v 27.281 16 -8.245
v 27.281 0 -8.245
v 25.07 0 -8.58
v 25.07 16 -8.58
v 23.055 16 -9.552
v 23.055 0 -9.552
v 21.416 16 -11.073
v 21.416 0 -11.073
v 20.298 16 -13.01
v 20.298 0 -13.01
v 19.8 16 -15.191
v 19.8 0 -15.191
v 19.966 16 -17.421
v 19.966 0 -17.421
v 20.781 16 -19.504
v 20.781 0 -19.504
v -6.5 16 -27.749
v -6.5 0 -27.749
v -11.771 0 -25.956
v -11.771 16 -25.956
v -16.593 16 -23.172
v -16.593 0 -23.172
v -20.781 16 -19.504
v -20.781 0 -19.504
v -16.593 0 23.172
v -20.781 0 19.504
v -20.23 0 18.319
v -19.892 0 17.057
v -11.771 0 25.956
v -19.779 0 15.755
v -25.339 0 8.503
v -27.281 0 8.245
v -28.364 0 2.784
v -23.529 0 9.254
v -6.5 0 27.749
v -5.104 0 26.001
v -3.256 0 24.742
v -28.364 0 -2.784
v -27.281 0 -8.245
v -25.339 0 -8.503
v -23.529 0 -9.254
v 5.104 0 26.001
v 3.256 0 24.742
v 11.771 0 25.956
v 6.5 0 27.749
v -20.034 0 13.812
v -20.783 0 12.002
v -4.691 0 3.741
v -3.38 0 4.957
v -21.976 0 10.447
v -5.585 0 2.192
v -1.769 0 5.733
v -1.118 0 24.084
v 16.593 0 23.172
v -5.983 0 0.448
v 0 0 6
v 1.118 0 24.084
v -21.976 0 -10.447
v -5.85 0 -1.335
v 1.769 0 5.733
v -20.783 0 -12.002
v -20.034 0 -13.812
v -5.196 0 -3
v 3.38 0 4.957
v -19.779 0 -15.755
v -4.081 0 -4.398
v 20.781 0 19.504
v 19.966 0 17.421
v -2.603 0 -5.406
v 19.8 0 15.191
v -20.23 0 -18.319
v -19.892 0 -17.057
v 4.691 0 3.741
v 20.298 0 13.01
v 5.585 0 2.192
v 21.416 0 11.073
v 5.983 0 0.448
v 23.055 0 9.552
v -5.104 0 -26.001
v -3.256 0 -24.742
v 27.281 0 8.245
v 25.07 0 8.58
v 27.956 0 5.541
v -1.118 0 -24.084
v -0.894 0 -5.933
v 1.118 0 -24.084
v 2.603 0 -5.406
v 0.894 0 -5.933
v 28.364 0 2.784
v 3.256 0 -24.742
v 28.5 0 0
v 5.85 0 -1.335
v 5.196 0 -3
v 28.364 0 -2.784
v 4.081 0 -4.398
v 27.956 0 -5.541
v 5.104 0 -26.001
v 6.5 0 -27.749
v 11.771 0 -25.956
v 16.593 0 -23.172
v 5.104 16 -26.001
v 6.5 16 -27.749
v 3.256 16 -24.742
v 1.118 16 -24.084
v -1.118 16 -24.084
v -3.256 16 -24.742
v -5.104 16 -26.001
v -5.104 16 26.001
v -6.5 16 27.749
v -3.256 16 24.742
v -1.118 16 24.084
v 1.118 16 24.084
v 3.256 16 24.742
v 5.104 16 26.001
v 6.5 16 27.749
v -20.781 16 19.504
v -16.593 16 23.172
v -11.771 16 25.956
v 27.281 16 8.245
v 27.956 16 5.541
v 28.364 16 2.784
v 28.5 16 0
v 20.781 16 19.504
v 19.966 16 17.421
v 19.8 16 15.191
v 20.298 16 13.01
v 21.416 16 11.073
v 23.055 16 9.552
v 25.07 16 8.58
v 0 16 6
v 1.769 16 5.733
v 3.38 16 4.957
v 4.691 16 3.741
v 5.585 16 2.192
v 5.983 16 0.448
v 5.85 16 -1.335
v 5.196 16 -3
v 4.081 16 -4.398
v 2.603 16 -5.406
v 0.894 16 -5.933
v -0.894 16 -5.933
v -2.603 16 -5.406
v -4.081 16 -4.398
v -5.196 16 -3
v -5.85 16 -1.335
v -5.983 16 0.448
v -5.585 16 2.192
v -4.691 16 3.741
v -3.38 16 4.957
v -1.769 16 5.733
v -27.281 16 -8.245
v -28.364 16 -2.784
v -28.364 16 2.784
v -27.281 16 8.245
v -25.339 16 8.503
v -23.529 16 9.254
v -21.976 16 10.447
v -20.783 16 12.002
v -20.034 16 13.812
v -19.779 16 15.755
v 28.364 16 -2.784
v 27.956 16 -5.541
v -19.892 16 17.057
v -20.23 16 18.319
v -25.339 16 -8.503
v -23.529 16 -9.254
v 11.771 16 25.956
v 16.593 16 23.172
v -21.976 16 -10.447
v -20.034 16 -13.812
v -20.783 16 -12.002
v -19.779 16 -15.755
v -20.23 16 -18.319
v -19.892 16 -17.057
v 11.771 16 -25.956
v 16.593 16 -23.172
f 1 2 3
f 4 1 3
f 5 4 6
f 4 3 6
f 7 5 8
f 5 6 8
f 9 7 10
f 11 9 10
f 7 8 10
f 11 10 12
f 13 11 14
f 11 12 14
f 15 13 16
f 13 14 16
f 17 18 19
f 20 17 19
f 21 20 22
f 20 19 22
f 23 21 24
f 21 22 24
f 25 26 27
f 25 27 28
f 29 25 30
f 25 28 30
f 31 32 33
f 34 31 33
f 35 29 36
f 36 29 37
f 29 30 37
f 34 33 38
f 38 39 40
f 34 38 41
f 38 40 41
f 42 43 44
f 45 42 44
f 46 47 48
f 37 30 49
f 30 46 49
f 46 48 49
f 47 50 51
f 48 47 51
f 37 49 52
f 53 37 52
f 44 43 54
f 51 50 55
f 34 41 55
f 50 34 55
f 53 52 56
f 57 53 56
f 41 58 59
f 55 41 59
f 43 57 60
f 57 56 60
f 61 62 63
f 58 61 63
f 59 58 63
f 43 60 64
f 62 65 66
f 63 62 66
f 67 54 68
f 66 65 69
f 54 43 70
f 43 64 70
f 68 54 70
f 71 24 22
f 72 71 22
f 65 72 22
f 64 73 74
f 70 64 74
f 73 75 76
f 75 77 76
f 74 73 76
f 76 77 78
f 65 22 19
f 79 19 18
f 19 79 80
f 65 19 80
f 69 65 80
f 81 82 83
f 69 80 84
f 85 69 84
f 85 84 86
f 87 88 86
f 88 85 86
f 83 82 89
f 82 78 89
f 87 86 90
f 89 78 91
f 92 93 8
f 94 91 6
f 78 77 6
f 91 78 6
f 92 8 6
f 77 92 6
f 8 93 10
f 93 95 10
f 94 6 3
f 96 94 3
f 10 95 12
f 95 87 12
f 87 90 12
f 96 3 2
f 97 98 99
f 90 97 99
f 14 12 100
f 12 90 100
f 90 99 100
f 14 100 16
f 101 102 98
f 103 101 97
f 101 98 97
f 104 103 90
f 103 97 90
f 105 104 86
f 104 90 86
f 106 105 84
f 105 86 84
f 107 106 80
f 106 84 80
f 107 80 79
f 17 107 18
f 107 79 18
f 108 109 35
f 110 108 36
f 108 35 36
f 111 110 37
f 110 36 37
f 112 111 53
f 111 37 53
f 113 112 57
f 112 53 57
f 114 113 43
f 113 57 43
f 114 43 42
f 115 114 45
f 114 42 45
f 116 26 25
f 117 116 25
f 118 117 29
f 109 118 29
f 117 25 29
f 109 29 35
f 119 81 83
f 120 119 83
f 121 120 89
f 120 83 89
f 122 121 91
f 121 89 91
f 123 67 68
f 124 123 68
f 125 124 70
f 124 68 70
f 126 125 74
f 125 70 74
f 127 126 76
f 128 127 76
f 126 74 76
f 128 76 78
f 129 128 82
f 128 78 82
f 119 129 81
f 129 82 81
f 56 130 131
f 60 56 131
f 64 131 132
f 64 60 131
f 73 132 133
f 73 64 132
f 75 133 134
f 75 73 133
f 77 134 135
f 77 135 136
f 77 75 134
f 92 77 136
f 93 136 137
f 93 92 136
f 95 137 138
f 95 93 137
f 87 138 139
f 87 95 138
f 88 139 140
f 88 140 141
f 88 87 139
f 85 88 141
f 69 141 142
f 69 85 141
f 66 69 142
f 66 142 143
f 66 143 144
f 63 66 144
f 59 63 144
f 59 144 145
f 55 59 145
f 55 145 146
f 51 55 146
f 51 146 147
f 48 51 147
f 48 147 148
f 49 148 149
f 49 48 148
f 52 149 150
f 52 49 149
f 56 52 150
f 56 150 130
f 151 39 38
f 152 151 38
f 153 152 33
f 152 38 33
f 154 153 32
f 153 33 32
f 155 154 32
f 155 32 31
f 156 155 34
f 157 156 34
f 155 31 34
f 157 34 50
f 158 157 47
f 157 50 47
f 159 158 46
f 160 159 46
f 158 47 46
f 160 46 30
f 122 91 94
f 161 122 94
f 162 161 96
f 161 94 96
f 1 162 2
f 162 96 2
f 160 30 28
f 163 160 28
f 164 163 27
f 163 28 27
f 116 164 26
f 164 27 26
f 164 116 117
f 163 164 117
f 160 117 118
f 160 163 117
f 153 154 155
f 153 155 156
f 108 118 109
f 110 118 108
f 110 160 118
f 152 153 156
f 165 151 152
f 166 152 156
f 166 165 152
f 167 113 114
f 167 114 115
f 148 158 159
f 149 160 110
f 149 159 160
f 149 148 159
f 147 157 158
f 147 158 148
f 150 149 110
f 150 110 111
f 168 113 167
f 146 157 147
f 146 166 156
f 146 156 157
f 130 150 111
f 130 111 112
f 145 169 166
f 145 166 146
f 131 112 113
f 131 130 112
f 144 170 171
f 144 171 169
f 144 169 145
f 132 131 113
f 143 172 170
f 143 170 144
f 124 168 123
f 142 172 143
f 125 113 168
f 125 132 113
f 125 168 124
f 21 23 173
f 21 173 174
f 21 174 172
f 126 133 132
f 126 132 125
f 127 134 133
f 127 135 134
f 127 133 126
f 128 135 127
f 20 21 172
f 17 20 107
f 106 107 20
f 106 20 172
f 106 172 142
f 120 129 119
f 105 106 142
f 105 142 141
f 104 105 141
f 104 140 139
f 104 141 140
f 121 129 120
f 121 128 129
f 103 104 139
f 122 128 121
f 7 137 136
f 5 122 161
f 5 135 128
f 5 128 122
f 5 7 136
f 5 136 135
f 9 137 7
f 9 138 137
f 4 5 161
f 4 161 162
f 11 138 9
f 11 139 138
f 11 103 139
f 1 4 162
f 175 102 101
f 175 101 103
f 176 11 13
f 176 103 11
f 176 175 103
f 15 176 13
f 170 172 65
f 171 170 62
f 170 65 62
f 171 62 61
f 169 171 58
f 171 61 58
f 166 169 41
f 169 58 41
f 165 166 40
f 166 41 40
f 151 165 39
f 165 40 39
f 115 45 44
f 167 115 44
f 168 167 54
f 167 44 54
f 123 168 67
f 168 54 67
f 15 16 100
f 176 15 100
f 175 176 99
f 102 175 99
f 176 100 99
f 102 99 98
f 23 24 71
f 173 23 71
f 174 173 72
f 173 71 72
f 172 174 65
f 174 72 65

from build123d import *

# Parameters (mm, degrees)
CROQUIS1_R              = 6
SALIENTE_EXTRUIR1_DEPTH = 16


with BuildPart() as part:
    # Croquis1 → Saliente-Extruir1 (new body)
    with BuildSketch(Plane(origin=(0, 0, 0), x_dir=(1, 0, 0), z_dir=(0, 1, 0))):
        with BuildLine():
            ThreePointArc((27.281229681, -8.245271801), (28.193661042, -4.167430508), (28.5, 0))
            ThreePointArc((28.5, 0), (28.193661042, 4.167430508), (27.281229681, 8.245271801))
            ThreePointArc((27.281229681, 8.245271801), (20.784609691, 12), (20.781229681, 19.50360205))
            ThreePointArc((20.781229681, 19.50360205), (14.25, 24.681724008), (6.5, 27.748873851))
            ThreePointArc((6.5, 27.748873851), (0, 24), (-6.5, 27.748873851))
            ThreePointArc((-6.5, 27.748873851), (-14.25, 24.681724008), (-20.781229681, 19.50360205))
            ThreePointArc((-20.781229681, 19.50360205), (-20.033536457, 17.695055573), (-19.778532486, 15.754731247))
            ThreePointArc((-19.778532486, 15.754731247), (-21.975611771, 10.447131827), (-27.281229681, 8.245271801))
            ThreePointArc((-27.281229681, 8.245271801), (-28.5, 0), (-27.281229681, -8.245271801))
            ThreePointArc((-27.281229681, -8.245271801), (-21.975611771, -10.447131827), (-19.778532486, -15.754731247))
            ThreePointArc((-19.778532486, -15.754731247), (-20.033536457, -17.695055573), (-20.781229681, -19.50360205))
            ThreePointArc((-20.781229681, -19.50360205), (-14.25, -24.681724008), (-6.5, -27.748873851))
            ThreePointArc((-6.5, -27.748873851), (0, -24), (6.5, -27.748873851))
            ThreePointArc((6.5, -27.748873851), (14.25, -24.681724008), (20.781229681, -19.50360205))
            ThreePointArc((20.781229681, -19.50360205), (20.784609691, -12), (27.281229681, -8.245271801))
        make_face()
        with Locations(Location((0, 0, 0), (0, 0, 270))):
            Circle(CROQUIS1_R, mode=Mode.SUBTRACT)
    extrude(amount=SALIENTE_EXTRUIR1_DEPTH)


solid = part.part
